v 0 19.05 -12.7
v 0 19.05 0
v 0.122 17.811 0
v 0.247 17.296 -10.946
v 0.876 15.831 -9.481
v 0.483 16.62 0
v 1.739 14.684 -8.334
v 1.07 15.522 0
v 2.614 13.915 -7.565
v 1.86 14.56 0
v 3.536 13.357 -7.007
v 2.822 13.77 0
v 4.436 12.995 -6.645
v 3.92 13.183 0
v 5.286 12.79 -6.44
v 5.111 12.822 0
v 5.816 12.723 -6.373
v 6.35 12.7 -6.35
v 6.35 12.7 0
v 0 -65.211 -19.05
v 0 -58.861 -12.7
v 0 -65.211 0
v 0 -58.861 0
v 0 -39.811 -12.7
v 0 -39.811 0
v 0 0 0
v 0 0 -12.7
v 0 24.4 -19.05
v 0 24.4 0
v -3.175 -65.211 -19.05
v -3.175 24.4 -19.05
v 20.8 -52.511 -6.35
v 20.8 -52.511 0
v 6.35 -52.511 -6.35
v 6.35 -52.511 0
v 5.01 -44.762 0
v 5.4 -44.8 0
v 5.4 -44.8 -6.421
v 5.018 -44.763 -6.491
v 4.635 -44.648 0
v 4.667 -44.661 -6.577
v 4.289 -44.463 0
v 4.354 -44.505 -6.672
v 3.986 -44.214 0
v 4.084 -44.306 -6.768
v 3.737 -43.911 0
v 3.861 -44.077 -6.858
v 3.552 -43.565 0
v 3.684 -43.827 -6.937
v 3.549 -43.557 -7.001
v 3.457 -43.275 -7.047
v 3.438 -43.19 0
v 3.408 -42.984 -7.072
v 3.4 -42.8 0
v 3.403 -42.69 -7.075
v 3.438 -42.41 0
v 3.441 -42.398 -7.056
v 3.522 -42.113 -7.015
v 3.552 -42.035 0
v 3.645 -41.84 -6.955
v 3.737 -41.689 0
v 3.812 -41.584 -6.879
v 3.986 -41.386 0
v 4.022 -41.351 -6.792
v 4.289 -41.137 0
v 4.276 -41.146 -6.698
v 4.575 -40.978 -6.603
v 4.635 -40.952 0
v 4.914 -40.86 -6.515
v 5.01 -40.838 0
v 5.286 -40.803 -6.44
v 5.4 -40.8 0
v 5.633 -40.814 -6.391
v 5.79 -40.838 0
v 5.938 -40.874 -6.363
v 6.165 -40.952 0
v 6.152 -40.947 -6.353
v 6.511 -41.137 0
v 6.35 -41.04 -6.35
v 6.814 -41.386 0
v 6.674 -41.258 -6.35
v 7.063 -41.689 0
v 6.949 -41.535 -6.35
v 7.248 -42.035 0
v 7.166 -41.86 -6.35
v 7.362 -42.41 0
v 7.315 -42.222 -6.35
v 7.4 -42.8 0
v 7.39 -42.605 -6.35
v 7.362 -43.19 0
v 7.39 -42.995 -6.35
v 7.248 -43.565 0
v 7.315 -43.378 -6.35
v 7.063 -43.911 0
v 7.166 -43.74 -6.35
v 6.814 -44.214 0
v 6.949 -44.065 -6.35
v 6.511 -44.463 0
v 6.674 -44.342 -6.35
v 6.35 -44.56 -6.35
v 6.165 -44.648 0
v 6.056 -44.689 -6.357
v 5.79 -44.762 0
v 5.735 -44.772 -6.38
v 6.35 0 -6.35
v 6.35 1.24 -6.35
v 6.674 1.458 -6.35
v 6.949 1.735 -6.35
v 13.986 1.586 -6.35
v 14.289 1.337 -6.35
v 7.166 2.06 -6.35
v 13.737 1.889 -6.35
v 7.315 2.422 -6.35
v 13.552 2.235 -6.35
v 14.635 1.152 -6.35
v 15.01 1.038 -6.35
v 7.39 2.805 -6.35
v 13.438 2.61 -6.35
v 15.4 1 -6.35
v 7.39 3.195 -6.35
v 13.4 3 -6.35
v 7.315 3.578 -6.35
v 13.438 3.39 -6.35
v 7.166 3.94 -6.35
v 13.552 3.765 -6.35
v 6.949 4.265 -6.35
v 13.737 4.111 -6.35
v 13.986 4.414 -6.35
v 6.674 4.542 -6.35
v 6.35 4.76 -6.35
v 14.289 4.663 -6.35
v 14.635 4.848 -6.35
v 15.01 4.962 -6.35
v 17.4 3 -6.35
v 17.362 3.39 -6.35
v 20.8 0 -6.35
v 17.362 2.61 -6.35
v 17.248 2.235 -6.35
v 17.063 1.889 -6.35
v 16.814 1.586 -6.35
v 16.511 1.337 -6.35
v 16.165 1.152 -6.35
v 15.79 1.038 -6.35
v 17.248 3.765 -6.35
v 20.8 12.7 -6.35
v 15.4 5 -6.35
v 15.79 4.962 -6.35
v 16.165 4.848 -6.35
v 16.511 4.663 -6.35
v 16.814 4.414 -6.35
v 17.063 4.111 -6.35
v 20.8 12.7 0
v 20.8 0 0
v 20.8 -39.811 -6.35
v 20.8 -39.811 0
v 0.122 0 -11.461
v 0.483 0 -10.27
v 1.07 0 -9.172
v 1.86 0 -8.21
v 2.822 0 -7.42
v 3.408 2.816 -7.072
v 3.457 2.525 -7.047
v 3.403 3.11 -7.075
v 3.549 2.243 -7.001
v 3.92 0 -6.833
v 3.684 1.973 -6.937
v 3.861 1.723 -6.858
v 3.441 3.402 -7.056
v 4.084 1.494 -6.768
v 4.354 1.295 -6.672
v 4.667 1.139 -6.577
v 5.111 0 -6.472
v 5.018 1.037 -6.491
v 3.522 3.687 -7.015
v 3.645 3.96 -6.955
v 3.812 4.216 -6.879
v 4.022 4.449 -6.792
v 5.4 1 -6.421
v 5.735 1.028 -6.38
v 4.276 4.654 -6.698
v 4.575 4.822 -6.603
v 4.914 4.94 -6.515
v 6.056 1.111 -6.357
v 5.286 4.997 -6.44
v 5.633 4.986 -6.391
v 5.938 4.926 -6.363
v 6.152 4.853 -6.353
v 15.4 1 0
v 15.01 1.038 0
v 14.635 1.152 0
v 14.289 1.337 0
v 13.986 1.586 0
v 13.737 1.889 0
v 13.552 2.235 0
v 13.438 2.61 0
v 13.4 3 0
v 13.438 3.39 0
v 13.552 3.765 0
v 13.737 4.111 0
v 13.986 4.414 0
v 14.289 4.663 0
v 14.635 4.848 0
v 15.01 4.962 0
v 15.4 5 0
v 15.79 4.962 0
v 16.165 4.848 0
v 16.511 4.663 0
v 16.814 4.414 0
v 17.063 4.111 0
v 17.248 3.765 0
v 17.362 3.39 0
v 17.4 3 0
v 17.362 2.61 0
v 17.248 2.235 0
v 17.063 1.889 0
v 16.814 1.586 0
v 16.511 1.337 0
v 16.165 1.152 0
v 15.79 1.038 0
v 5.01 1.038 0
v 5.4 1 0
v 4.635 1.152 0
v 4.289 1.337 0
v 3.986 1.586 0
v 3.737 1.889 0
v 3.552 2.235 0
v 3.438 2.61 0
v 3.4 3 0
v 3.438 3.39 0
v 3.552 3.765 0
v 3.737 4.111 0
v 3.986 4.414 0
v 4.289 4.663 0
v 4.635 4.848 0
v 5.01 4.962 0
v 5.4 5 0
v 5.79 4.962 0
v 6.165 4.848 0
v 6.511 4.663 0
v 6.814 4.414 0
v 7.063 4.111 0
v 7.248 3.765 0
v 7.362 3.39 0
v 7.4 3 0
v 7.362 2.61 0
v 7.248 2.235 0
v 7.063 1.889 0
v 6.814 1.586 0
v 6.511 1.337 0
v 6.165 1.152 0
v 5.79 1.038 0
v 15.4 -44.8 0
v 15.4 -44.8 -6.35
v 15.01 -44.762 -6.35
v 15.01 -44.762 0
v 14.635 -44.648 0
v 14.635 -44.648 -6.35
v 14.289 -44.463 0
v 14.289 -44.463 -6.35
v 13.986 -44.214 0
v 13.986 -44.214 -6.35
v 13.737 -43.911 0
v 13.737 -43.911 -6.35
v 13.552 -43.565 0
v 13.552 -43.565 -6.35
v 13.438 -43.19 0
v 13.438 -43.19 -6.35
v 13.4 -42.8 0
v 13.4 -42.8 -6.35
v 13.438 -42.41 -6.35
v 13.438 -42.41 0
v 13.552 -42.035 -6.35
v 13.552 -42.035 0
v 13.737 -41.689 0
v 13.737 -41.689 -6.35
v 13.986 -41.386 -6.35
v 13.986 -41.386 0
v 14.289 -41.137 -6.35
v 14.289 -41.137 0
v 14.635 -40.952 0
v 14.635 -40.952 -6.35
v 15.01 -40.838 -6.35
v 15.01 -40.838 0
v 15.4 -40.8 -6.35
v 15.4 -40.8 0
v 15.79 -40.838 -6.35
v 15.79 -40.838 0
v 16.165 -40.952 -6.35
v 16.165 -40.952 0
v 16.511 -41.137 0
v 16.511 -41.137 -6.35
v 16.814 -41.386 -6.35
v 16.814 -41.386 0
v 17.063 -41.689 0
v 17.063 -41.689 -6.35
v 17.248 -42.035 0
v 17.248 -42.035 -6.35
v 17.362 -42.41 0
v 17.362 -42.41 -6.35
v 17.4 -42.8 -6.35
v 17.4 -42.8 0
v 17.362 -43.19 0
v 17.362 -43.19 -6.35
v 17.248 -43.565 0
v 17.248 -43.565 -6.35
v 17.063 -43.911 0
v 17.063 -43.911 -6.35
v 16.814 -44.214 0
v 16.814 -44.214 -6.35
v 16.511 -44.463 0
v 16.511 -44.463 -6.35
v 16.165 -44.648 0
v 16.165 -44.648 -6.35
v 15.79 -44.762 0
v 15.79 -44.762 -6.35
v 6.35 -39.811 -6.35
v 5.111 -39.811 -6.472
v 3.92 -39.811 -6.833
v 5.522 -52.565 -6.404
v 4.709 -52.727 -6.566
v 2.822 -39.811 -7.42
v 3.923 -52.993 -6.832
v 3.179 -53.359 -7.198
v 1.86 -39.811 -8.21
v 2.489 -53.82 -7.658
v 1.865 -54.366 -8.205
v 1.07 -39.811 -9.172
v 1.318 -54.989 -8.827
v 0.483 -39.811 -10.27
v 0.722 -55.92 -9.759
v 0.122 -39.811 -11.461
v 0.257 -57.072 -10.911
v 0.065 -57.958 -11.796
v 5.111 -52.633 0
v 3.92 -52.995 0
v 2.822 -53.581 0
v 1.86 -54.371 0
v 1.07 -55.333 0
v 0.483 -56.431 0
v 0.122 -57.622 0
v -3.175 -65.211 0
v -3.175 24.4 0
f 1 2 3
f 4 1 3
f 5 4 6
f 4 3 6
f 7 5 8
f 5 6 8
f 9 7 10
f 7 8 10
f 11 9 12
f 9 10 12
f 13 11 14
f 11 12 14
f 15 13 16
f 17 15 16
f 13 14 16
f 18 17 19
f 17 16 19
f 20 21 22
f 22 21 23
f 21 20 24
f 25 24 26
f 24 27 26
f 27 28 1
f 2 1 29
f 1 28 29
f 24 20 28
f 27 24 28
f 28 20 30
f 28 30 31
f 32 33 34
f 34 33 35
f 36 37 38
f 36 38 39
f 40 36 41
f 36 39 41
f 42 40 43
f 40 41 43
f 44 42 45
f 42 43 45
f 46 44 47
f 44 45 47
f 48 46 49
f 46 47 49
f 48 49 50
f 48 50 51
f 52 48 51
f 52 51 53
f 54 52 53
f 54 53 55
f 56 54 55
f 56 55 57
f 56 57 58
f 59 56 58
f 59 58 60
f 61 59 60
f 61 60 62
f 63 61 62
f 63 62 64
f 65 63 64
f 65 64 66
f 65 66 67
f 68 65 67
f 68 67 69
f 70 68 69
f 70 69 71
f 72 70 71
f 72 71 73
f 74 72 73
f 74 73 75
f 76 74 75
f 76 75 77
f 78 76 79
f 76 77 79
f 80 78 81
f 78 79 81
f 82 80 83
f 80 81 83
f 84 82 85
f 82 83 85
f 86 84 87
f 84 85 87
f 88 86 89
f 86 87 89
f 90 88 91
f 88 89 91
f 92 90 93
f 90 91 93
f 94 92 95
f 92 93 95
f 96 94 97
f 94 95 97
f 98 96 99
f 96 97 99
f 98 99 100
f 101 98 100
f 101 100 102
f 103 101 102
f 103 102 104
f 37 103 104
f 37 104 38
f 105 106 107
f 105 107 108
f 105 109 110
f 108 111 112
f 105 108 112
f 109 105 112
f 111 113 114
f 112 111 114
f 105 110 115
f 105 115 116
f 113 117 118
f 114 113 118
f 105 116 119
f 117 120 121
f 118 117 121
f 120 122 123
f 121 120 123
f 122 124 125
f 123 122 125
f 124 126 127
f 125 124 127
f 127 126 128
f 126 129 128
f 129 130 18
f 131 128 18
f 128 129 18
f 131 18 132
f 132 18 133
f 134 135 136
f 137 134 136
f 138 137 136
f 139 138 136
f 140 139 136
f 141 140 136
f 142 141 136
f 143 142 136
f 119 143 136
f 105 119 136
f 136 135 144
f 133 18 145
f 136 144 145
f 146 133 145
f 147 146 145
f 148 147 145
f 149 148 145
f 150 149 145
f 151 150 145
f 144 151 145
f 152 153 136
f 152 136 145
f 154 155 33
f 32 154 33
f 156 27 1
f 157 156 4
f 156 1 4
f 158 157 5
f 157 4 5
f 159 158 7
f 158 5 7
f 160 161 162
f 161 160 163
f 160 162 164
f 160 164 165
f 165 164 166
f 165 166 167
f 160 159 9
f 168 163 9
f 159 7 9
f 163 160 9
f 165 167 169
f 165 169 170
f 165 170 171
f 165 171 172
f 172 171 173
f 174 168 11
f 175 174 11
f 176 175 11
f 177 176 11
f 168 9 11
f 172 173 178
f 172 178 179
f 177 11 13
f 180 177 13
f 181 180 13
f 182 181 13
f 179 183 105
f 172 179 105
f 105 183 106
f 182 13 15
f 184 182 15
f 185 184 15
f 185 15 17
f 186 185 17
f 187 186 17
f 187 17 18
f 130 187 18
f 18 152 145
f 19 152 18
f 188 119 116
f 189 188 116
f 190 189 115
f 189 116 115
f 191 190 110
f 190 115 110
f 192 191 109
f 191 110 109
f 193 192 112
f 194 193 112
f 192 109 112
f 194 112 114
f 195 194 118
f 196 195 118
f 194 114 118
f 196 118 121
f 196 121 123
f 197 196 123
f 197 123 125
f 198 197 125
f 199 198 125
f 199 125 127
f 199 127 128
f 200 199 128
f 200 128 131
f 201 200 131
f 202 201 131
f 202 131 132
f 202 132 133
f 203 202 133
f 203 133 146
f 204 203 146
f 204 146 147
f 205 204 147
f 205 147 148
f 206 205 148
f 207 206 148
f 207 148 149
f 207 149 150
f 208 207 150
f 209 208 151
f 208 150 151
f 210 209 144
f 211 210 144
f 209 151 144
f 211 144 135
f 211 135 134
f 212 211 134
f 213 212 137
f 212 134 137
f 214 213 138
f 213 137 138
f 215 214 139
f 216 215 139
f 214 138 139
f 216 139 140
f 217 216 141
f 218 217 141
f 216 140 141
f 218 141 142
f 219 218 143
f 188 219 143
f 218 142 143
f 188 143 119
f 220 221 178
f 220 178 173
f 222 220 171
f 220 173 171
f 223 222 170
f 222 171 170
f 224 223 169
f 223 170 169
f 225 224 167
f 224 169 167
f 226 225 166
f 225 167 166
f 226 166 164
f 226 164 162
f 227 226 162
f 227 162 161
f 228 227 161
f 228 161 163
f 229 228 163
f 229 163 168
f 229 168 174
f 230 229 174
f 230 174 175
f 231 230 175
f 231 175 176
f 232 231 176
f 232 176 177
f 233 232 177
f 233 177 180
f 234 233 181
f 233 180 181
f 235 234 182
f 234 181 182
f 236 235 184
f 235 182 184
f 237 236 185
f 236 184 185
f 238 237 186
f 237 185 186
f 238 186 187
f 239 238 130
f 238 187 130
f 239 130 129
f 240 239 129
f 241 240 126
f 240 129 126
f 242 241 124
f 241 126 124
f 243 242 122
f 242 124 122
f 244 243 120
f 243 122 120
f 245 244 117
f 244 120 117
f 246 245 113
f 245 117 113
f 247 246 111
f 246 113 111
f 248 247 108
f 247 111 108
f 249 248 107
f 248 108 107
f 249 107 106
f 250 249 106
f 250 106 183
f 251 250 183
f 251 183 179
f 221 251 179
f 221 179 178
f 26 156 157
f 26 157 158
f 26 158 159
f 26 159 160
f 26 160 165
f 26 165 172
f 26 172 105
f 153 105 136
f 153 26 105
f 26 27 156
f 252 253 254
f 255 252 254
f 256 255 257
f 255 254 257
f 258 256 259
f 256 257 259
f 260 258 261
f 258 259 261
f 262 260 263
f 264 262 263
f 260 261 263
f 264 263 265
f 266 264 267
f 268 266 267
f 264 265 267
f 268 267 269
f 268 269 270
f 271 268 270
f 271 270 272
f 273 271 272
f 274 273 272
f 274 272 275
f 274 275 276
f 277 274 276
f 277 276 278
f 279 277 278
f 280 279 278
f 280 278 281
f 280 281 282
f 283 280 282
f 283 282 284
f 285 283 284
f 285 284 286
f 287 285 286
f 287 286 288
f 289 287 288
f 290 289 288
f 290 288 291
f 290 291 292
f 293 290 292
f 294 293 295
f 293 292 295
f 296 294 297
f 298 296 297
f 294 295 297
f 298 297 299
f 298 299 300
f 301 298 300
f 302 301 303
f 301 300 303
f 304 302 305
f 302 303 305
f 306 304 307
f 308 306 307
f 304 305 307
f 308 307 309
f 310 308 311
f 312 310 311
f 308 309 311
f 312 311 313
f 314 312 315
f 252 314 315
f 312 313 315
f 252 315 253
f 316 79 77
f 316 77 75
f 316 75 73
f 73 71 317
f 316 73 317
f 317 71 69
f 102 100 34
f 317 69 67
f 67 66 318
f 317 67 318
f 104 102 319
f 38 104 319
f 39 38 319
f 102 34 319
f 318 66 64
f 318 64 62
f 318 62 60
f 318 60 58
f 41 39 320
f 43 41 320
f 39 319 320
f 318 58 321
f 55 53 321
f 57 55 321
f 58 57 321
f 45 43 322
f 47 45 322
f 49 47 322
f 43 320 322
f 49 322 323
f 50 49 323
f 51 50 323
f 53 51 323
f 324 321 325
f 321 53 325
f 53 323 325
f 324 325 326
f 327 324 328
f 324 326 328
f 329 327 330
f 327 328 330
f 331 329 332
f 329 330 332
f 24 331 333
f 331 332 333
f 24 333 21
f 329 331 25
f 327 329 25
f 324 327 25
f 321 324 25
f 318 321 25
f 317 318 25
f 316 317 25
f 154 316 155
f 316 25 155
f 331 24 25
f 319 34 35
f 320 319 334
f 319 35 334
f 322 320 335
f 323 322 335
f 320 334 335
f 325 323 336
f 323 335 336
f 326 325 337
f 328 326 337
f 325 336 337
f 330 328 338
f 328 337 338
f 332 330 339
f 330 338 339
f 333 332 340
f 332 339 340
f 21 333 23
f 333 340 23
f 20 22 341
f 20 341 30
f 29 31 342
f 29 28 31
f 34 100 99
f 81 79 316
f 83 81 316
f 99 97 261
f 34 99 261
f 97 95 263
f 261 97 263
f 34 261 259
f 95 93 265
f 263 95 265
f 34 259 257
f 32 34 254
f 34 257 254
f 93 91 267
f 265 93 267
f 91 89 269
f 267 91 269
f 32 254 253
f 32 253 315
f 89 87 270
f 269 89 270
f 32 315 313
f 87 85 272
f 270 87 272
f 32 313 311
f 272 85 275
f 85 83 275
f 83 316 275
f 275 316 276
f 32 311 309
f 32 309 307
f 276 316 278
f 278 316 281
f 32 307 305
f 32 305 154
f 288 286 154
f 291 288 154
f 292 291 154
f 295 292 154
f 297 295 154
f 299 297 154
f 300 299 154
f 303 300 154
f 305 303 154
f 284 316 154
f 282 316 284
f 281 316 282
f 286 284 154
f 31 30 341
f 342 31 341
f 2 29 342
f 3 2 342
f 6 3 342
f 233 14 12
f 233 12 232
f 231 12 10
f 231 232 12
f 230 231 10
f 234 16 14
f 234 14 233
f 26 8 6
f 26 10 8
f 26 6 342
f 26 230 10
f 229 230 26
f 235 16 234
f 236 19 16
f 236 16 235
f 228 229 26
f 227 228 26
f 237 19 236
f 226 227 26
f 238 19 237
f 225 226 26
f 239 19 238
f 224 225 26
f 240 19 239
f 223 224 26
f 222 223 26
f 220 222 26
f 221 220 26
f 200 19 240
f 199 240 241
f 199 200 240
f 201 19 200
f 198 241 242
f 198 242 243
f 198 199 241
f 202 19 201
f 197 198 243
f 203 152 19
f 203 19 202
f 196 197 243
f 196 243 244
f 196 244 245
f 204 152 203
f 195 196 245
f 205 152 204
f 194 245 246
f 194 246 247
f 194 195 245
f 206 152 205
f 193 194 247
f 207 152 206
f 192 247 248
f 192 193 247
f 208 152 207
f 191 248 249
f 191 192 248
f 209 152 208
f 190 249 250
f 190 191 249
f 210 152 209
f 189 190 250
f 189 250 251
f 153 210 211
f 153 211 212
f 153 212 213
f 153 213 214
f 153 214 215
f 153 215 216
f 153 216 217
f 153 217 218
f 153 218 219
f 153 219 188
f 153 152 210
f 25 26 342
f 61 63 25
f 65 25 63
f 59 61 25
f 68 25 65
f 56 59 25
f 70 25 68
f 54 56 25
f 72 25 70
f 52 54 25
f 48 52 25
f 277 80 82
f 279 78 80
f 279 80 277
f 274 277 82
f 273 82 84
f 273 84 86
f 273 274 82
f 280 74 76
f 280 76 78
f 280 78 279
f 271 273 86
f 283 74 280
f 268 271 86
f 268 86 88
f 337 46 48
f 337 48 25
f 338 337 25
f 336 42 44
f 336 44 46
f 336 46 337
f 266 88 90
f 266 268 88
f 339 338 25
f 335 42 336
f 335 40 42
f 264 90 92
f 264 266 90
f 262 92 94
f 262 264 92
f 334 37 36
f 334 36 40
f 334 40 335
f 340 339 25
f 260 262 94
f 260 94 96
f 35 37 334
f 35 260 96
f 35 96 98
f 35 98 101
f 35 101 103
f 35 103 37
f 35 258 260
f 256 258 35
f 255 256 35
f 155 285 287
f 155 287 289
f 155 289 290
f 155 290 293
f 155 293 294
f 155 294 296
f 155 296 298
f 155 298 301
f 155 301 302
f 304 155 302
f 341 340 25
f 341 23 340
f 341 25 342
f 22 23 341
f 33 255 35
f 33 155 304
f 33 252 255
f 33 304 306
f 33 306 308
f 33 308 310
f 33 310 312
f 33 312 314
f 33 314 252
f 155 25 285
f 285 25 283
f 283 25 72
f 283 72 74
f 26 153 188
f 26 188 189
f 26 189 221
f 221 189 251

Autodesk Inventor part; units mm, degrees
ref_plane "YZ Plane" through (0, 0, 0) normal (1, 0, 0) x (0, 1, 0)
ref_plane "XZ Plane" through (0, 0, 0) normal (0, 1, 0) x (-1, 0, 0)
ref_plane "XY Plane" through (0, 0, 0) normal (0, 0, 1) x (1, 0, 0)
sketch "Sketch1" plane through (0, 0, 0) normal (0, 0, 1) x (1, 0, 0)
  line L0 (0, 0) -> (20.8, 0)
  line L1 (20.8, 0) -> (20.8, 12.7)
  line L2 (20.8, 12.7) -> (0, 12.7)
  line L3 (0, 12.7) -> (0, 0)
  line L4 (0, -39.8112) -> (20.8, -39.8112)
  line L5 (20.8, -39.8112) -> (20.8, -52.5112)
  line L6 (20.8, -52.5112) -> (0, -52.5112)
  line L7 (0, -52.5112) -> (0, -39.8112)
  line L8 (10.4, 12.7) -> (10.4, 0)
  point P0 (5.4, 3)
  dimension "d0" = 20.8
  dimension "d1" = 12.7
  dimension "d2" = 39.8112
  dimension "d33" = 3
  dimension "d34" = 5
  dimension "d41" = 10.4
extrude "Extrusion1" add sketch "Sketch1" against normal blind 6.35
hole "Hole3" at (5.4, 3, 0) direction (0, 0, -1) diameter 4 depth 25.4
pattern_linear "Rectangular Pattern1" count 2 spacing 10 along (1, 0, 0) count 2 spacing 45.8 along (0, -1, 0) of "Hole3"
sketch "Sketch3" plane through (0, 0, 0) normal (-1, 0, 0) x (0, 0, 1)
  line L0 (0, 12.7) -> (0, 0) projected
  line L1 (-19.05, 24.4) -> (0, 24.4)
  line L2 (0, 24.4) -> (0, -65.2112)
  line L3 (0, -65.2112) -> (-19.05, -65.2112)
  line L4 (-19.05, -65.2112) -> (-19.05, 24.4)
  line L5 (0, -39.8112) -> (-6.35, -39.8112) projected
  dimension "d42" = 19.05
  dimension "ServoMountLength" = 89.6112
  dimension "d45" = 25.4
extrude "Extrusion2" add sketch "Sketch3" along normal blind 3.175
fillet "Fillet1" radius 6.35 4 edges at (0, 6.35, -6.35) (0, 12.7, -3.175) (0, -46.1612, -6.35) (0, -52.5112, -3.175)
equation "\"d0\" = ServoWidth + ServoTolerance"
equation "\"d2\" = ServoLength + ServoTolerance"
equation "\"d33\" = ServoScrewOffsetFromSide - 0.5 * ServoTolerance"
equation "\"d34\" = 0.5 * ServoScrewSpacing"
equation "\"d41\" = 0.5 * ServoTolerance + 0.5 * ServoWidth"
equation "\"d37\" = ServoScrewSpacing"
equation "\"d40\" = ServoScrewSpacingLength"
equation "\"ServoTolerance\" = 1"
equation "\"ServoWidth\" = 19.8"
equation "\"ServoLength\" = 38.8112"
equation "\"ServoScrewSpacing\" = 10"
equation "\"ServoScrewSpacingLength\" = 45.8"
equation "\"ServoScrewOffsetFromSide\" = 3.5"
properties part number "ServoMount" material "ABS Plastic"
